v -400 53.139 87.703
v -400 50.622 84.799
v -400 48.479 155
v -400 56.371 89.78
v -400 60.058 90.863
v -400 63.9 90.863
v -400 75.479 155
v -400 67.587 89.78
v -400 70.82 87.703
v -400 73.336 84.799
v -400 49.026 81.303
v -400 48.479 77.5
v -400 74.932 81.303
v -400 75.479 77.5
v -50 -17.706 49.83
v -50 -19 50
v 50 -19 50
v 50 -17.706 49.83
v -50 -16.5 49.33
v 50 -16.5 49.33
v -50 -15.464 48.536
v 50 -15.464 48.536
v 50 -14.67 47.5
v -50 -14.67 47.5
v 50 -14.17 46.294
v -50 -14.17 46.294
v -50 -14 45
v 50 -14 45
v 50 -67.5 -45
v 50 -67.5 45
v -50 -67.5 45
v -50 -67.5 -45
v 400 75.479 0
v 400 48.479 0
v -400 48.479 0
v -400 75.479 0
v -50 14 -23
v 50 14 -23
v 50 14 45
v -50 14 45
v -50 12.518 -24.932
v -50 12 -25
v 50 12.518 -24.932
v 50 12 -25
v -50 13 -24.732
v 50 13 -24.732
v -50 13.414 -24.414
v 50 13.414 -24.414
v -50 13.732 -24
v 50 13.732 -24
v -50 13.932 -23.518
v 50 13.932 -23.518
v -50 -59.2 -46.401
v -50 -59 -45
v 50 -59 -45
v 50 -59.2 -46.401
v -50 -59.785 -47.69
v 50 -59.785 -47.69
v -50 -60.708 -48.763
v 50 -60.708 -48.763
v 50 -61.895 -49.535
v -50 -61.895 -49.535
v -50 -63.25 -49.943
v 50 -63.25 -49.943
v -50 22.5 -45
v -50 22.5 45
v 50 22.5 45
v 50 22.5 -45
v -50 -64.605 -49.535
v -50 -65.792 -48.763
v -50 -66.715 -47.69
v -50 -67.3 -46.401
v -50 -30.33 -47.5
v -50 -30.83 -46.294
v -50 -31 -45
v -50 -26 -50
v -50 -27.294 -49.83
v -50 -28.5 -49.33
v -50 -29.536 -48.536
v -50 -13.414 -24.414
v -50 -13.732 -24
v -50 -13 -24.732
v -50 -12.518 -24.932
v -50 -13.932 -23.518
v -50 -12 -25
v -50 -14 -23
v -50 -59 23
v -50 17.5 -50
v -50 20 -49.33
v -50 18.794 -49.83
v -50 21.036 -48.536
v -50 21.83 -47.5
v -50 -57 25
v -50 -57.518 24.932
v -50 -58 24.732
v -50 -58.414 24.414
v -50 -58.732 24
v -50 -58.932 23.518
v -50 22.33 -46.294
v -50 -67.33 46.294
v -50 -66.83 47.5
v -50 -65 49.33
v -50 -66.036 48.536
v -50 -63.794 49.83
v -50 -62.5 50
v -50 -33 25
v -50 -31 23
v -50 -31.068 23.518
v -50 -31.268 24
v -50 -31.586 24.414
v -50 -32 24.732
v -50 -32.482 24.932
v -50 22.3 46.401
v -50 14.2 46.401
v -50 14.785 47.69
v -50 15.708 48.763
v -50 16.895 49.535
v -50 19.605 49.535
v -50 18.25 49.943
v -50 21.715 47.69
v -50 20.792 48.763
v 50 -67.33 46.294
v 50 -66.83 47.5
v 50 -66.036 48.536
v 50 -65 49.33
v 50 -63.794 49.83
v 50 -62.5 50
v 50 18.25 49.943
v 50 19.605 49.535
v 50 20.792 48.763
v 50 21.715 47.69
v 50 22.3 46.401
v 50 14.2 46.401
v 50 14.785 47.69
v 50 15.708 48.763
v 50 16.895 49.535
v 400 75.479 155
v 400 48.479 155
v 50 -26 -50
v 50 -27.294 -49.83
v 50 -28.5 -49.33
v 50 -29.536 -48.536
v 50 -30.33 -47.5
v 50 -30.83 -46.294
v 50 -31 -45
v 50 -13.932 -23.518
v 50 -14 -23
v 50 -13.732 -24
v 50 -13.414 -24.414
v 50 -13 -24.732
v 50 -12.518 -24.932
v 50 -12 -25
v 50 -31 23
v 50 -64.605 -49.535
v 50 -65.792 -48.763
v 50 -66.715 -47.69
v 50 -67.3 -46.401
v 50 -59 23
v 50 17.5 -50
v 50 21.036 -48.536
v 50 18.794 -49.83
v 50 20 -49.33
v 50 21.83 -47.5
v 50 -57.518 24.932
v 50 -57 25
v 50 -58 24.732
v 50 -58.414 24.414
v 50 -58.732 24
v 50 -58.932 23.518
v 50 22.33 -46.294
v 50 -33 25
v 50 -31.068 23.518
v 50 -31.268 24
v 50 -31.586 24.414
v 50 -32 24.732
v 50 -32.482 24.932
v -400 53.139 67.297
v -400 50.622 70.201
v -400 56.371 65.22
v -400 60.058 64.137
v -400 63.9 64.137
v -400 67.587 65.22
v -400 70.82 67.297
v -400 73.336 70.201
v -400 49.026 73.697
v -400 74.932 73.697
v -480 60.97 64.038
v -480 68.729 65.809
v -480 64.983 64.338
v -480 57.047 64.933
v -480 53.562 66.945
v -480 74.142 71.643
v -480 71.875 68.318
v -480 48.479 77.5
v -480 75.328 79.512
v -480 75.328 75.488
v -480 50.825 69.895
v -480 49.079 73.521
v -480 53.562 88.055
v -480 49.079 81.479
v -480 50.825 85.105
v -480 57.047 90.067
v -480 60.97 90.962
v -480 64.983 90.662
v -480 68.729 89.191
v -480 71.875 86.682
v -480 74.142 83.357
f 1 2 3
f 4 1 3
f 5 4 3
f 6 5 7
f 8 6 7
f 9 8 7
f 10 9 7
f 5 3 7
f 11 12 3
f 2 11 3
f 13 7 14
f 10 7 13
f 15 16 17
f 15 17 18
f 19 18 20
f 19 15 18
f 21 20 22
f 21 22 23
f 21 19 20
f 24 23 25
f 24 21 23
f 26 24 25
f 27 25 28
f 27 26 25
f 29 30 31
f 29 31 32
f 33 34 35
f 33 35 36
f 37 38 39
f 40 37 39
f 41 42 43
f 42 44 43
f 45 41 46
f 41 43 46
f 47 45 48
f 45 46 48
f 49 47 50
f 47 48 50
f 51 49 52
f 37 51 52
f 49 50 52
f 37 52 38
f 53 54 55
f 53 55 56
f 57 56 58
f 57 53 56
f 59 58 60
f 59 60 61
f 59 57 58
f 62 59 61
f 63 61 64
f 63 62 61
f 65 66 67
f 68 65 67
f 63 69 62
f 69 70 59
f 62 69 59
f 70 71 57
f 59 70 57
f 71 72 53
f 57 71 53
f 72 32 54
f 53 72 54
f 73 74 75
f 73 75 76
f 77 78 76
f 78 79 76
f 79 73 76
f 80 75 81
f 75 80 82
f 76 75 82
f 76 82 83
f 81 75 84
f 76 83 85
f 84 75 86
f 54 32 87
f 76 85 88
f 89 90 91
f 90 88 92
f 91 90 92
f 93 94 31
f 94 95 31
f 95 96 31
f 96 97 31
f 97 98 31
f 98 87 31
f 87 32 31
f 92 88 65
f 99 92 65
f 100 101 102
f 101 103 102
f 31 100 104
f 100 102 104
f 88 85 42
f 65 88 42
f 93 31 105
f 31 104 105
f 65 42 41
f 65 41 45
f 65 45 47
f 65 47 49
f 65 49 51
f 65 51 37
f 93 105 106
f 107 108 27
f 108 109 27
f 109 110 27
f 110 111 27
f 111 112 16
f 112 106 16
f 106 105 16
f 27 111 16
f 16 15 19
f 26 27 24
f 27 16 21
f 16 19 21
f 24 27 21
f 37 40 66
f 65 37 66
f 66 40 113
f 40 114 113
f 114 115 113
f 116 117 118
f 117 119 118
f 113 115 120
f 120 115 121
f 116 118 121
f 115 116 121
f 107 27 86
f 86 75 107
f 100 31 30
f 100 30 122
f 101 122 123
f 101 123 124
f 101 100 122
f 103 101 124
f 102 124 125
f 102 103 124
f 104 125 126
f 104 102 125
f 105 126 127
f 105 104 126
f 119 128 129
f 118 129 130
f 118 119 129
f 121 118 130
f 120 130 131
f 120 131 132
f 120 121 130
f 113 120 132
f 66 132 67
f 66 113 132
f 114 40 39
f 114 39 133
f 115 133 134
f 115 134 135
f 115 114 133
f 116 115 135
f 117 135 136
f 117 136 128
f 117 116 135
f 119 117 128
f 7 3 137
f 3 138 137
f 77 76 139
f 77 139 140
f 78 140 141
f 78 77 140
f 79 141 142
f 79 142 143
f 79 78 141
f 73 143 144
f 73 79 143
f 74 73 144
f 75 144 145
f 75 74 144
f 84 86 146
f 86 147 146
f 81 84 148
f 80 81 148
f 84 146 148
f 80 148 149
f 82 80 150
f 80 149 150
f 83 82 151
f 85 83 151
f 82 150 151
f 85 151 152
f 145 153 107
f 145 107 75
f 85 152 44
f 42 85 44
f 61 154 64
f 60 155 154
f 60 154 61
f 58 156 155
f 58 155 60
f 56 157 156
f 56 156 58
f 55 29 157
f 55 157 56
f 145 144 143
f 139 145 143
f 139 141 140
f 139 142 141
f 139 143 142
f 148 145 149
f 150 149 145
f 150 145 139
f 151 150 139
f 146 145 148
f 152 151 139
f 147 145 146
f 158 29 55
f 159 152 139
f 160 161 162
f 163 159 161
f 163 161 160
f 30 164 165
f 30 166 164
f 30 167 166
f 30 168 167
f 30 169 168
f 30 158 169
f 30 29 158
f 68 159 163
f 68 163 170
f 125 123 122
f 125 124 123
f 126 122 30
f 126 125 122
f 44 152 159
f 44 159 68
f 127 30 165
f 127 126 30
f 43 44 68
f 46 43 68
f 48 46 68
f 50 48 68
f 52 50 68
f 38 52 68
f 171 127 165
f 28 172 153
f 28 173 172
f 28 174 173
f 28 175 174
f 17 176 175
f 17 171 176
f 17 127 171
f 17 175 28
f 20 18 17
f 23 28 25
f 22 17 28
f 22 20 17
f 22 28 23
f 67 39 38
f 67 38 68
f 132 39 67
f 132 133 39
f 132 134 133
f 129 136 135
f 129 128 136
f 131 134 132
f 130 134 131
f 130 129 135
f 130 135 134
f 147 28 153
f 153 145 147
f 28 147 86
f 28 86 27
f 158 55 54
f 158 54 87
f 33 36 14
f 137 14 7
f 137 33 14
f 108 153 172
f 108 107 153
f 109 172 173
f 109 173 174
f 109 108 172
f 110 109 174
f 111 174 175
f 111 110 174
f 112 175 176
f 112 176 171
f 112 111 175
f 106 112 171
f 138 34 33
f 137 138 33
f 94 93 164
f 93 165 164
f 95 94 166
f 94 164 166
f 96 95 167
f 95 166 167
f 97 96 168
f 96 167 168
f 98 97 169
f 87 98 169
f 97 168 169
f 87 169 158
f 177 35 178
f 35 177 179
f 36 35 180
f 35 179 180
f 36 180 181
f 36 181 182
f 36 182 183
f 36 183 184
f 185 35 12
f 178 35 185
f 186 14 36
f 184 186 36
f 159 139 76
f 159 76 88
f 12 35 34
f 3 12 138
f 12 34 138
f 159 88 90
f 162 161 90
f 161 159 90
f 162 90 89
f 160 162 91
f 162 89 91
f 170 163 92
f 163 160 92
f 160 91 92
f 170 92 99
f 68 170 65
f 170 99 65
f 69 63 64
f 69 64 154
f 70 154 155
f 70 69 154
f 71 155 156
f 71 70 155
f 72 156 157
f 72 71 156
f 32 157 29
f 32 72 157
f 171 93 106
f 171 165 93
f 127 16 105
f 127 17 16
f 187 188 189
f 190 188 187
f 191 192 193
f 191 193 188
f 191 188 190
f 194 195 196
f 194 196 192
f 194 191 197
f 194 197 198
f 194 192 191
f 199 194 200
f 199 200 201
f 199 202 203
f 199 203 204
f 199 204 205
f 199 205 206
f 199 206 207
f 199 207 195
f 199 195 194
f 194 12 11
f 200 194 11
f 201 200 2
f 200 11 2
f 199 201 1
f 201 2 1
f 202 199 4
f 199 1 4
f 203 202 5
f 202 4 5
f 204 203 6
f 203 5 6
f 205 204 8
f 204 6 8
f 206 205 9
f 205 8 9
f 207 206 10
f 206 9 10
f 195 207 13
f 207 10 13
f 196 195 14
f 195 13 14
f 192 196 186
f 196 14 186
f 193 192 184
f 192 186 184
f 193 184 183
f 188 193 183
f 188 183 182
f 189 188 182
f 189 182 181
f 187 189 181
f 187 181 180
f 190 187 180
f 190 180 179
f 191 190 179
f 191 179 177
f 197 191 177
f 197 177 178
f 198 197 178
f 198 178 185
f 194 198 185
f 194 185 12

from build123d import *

# Parameters (mm, degrees)
F0_W        = 100
F0_H        = 100
F1_DEPTH    = 22.5
F2_W        = 28
F2_H        = 75
F3_DEPTH    = 100
F5_DEPTH    = 50
F6_T1_DEPTH = 125
F7_R        = 2
F8_W        = 27
F8_H        = 155
F9_DEPTH    = 400
F10_R       = 13.5
F11_DEPTH   = 80


# Not quite as in the source:
# - a fillet or chamfer that OpenCascade refuses, or shapes differently, is made with other operations: its cross-section is extruded or revolved along the edge and cut away or added


with BuildPart() as f1:
    # F0 (on Front) → F1 (new body, symmetric)
    with BuildSketch(Plane.XZ):
        Rectangle(F0_W, F0_H)
    extrude(amount=F1_DEPTH, both=True)

    # F2 (on face) → F3 (cut, symmetric)
    with BuildSketch(Plane.YZ.offset(50)):
        with Locations((0, 12.5)):
            Rectangle(F2_W, F2_H)
    extrude(amount=F3_DEPTH, both=True, mode=Mode.SUBTRACT)

    # F4 (on Right) → F5 (join, symmetric)
    with BuildSketch(Plane.YZ):
        Polygon((-22.5, -50), (-22.5, 50), (-67.5, 50), (-67.5, -50), (-59, -50), (-59, 25), (-31, 25), (-31, -50), align=None)
    extrude(amount=F5_DEPTH, both=True)

    # F6: fillet of radius 5 on 8 edges, made by hand

    # F6_s2 → F6_t1 (cut)
    with BuildSketch(Plane.YZ.offset(-62.5)):
        with BuildLine():
            ThreePointArc((-19, 50), (-15.4644660941, 48.5355339059), (-14, 45))
            Line((-14, 45), (-14, 50))
            Line((-14, 50), (-19, 50))
        make_face()
        with BuildLine():
            ThreePointArc((14, 45), (15.4644660941, 48.5355339059), (19, 50))
            Line((19, 50), (14, 50))
            Line((14, 50), (14, 45))
        make_face()
        with BuildLine():
            ThreePointArc((-59, -45), (-60.4644660941, -48.5355339059), (-64, -50))
            Line((-64, -50), (-59, -50))
            Line((-59, -50), (-59, -45))
        make_face()
        with BuildLine():
            ThreePointArc((-67.5, 45), (-66.0355339059, 48.5355339059), (-62.5, 50))
            Line((-62.5, 50), (-67.5, 50))
            Line((-67.5, 50), (-67.5, 45))
        make_face()
        with BuildLine():
            ThreePointArc((-62.5, -50), (-66.0355339059, -48.5355339059), (-67.5, -45))
            Line((-67.5, -45), (-67.5, -50))
            Line((-67.5, -50), (-62.5, -50))
        make_face()
        with BuildLine():
            ThreePointArc((17.5, 50), (21.0355339059, 48.5355339059), (22.5, 45))
            Line((22.5, 45), (22.5, 50))
            Line((22.5, 50), (17.5, 50))
        make_face()
        with BuildLine():
            ThreePointArc((-26, -50), (-29.5355339059, -48.5355339059), (-31, -45))
            Line((-31, -45), (-31, -50))
            Line((-31, -50), (-26, -50))
        make_face()
        with BuildLine():
            ThreePointArc((17.5, -50), (21.0355339059, -48.5355339059), (22.5, -45))
            Line((22.5, -45), (22.5, -50))
            Line((22.5, -50), (17.5, -50))
        make_face()
    extrude(amount=F6_T1_DEPTH, mode=Mode.SUBTRACT)

    # F7
    f7_edges = [f1.edges().sort_by_distance(p)[0] for p in [
        (0, 14, -25),
        (0, -14, -25),
        (0, -31, 25),
        (0, -59, 25),
    ]]
    fillet(f7_edges, radius=F7_R)


with BuildPart() as f9:
    # F8 (on Right) → F9 (new body, symmetric)
    with BuildSketch(Plane.YZ):
        with Locations((61.9791960033, 77.5)):
            Rectangle(F8_W, F8_H)
    extrude(amount=F9_DEPTH, both=True)

    # F10 (on face) → F11 (join)
    with BuildSketch(Plane(origin=(-400, 0, 0), x_dir=(0, -1, 0), z_dir=(-1, 0, 0))):
        with Locations((-61.9791960033, 77.5)):
            Circle(F10_R)
    extrude(amount=F11_DEPTH)


solid = Compound([f1.part, f9.part])
